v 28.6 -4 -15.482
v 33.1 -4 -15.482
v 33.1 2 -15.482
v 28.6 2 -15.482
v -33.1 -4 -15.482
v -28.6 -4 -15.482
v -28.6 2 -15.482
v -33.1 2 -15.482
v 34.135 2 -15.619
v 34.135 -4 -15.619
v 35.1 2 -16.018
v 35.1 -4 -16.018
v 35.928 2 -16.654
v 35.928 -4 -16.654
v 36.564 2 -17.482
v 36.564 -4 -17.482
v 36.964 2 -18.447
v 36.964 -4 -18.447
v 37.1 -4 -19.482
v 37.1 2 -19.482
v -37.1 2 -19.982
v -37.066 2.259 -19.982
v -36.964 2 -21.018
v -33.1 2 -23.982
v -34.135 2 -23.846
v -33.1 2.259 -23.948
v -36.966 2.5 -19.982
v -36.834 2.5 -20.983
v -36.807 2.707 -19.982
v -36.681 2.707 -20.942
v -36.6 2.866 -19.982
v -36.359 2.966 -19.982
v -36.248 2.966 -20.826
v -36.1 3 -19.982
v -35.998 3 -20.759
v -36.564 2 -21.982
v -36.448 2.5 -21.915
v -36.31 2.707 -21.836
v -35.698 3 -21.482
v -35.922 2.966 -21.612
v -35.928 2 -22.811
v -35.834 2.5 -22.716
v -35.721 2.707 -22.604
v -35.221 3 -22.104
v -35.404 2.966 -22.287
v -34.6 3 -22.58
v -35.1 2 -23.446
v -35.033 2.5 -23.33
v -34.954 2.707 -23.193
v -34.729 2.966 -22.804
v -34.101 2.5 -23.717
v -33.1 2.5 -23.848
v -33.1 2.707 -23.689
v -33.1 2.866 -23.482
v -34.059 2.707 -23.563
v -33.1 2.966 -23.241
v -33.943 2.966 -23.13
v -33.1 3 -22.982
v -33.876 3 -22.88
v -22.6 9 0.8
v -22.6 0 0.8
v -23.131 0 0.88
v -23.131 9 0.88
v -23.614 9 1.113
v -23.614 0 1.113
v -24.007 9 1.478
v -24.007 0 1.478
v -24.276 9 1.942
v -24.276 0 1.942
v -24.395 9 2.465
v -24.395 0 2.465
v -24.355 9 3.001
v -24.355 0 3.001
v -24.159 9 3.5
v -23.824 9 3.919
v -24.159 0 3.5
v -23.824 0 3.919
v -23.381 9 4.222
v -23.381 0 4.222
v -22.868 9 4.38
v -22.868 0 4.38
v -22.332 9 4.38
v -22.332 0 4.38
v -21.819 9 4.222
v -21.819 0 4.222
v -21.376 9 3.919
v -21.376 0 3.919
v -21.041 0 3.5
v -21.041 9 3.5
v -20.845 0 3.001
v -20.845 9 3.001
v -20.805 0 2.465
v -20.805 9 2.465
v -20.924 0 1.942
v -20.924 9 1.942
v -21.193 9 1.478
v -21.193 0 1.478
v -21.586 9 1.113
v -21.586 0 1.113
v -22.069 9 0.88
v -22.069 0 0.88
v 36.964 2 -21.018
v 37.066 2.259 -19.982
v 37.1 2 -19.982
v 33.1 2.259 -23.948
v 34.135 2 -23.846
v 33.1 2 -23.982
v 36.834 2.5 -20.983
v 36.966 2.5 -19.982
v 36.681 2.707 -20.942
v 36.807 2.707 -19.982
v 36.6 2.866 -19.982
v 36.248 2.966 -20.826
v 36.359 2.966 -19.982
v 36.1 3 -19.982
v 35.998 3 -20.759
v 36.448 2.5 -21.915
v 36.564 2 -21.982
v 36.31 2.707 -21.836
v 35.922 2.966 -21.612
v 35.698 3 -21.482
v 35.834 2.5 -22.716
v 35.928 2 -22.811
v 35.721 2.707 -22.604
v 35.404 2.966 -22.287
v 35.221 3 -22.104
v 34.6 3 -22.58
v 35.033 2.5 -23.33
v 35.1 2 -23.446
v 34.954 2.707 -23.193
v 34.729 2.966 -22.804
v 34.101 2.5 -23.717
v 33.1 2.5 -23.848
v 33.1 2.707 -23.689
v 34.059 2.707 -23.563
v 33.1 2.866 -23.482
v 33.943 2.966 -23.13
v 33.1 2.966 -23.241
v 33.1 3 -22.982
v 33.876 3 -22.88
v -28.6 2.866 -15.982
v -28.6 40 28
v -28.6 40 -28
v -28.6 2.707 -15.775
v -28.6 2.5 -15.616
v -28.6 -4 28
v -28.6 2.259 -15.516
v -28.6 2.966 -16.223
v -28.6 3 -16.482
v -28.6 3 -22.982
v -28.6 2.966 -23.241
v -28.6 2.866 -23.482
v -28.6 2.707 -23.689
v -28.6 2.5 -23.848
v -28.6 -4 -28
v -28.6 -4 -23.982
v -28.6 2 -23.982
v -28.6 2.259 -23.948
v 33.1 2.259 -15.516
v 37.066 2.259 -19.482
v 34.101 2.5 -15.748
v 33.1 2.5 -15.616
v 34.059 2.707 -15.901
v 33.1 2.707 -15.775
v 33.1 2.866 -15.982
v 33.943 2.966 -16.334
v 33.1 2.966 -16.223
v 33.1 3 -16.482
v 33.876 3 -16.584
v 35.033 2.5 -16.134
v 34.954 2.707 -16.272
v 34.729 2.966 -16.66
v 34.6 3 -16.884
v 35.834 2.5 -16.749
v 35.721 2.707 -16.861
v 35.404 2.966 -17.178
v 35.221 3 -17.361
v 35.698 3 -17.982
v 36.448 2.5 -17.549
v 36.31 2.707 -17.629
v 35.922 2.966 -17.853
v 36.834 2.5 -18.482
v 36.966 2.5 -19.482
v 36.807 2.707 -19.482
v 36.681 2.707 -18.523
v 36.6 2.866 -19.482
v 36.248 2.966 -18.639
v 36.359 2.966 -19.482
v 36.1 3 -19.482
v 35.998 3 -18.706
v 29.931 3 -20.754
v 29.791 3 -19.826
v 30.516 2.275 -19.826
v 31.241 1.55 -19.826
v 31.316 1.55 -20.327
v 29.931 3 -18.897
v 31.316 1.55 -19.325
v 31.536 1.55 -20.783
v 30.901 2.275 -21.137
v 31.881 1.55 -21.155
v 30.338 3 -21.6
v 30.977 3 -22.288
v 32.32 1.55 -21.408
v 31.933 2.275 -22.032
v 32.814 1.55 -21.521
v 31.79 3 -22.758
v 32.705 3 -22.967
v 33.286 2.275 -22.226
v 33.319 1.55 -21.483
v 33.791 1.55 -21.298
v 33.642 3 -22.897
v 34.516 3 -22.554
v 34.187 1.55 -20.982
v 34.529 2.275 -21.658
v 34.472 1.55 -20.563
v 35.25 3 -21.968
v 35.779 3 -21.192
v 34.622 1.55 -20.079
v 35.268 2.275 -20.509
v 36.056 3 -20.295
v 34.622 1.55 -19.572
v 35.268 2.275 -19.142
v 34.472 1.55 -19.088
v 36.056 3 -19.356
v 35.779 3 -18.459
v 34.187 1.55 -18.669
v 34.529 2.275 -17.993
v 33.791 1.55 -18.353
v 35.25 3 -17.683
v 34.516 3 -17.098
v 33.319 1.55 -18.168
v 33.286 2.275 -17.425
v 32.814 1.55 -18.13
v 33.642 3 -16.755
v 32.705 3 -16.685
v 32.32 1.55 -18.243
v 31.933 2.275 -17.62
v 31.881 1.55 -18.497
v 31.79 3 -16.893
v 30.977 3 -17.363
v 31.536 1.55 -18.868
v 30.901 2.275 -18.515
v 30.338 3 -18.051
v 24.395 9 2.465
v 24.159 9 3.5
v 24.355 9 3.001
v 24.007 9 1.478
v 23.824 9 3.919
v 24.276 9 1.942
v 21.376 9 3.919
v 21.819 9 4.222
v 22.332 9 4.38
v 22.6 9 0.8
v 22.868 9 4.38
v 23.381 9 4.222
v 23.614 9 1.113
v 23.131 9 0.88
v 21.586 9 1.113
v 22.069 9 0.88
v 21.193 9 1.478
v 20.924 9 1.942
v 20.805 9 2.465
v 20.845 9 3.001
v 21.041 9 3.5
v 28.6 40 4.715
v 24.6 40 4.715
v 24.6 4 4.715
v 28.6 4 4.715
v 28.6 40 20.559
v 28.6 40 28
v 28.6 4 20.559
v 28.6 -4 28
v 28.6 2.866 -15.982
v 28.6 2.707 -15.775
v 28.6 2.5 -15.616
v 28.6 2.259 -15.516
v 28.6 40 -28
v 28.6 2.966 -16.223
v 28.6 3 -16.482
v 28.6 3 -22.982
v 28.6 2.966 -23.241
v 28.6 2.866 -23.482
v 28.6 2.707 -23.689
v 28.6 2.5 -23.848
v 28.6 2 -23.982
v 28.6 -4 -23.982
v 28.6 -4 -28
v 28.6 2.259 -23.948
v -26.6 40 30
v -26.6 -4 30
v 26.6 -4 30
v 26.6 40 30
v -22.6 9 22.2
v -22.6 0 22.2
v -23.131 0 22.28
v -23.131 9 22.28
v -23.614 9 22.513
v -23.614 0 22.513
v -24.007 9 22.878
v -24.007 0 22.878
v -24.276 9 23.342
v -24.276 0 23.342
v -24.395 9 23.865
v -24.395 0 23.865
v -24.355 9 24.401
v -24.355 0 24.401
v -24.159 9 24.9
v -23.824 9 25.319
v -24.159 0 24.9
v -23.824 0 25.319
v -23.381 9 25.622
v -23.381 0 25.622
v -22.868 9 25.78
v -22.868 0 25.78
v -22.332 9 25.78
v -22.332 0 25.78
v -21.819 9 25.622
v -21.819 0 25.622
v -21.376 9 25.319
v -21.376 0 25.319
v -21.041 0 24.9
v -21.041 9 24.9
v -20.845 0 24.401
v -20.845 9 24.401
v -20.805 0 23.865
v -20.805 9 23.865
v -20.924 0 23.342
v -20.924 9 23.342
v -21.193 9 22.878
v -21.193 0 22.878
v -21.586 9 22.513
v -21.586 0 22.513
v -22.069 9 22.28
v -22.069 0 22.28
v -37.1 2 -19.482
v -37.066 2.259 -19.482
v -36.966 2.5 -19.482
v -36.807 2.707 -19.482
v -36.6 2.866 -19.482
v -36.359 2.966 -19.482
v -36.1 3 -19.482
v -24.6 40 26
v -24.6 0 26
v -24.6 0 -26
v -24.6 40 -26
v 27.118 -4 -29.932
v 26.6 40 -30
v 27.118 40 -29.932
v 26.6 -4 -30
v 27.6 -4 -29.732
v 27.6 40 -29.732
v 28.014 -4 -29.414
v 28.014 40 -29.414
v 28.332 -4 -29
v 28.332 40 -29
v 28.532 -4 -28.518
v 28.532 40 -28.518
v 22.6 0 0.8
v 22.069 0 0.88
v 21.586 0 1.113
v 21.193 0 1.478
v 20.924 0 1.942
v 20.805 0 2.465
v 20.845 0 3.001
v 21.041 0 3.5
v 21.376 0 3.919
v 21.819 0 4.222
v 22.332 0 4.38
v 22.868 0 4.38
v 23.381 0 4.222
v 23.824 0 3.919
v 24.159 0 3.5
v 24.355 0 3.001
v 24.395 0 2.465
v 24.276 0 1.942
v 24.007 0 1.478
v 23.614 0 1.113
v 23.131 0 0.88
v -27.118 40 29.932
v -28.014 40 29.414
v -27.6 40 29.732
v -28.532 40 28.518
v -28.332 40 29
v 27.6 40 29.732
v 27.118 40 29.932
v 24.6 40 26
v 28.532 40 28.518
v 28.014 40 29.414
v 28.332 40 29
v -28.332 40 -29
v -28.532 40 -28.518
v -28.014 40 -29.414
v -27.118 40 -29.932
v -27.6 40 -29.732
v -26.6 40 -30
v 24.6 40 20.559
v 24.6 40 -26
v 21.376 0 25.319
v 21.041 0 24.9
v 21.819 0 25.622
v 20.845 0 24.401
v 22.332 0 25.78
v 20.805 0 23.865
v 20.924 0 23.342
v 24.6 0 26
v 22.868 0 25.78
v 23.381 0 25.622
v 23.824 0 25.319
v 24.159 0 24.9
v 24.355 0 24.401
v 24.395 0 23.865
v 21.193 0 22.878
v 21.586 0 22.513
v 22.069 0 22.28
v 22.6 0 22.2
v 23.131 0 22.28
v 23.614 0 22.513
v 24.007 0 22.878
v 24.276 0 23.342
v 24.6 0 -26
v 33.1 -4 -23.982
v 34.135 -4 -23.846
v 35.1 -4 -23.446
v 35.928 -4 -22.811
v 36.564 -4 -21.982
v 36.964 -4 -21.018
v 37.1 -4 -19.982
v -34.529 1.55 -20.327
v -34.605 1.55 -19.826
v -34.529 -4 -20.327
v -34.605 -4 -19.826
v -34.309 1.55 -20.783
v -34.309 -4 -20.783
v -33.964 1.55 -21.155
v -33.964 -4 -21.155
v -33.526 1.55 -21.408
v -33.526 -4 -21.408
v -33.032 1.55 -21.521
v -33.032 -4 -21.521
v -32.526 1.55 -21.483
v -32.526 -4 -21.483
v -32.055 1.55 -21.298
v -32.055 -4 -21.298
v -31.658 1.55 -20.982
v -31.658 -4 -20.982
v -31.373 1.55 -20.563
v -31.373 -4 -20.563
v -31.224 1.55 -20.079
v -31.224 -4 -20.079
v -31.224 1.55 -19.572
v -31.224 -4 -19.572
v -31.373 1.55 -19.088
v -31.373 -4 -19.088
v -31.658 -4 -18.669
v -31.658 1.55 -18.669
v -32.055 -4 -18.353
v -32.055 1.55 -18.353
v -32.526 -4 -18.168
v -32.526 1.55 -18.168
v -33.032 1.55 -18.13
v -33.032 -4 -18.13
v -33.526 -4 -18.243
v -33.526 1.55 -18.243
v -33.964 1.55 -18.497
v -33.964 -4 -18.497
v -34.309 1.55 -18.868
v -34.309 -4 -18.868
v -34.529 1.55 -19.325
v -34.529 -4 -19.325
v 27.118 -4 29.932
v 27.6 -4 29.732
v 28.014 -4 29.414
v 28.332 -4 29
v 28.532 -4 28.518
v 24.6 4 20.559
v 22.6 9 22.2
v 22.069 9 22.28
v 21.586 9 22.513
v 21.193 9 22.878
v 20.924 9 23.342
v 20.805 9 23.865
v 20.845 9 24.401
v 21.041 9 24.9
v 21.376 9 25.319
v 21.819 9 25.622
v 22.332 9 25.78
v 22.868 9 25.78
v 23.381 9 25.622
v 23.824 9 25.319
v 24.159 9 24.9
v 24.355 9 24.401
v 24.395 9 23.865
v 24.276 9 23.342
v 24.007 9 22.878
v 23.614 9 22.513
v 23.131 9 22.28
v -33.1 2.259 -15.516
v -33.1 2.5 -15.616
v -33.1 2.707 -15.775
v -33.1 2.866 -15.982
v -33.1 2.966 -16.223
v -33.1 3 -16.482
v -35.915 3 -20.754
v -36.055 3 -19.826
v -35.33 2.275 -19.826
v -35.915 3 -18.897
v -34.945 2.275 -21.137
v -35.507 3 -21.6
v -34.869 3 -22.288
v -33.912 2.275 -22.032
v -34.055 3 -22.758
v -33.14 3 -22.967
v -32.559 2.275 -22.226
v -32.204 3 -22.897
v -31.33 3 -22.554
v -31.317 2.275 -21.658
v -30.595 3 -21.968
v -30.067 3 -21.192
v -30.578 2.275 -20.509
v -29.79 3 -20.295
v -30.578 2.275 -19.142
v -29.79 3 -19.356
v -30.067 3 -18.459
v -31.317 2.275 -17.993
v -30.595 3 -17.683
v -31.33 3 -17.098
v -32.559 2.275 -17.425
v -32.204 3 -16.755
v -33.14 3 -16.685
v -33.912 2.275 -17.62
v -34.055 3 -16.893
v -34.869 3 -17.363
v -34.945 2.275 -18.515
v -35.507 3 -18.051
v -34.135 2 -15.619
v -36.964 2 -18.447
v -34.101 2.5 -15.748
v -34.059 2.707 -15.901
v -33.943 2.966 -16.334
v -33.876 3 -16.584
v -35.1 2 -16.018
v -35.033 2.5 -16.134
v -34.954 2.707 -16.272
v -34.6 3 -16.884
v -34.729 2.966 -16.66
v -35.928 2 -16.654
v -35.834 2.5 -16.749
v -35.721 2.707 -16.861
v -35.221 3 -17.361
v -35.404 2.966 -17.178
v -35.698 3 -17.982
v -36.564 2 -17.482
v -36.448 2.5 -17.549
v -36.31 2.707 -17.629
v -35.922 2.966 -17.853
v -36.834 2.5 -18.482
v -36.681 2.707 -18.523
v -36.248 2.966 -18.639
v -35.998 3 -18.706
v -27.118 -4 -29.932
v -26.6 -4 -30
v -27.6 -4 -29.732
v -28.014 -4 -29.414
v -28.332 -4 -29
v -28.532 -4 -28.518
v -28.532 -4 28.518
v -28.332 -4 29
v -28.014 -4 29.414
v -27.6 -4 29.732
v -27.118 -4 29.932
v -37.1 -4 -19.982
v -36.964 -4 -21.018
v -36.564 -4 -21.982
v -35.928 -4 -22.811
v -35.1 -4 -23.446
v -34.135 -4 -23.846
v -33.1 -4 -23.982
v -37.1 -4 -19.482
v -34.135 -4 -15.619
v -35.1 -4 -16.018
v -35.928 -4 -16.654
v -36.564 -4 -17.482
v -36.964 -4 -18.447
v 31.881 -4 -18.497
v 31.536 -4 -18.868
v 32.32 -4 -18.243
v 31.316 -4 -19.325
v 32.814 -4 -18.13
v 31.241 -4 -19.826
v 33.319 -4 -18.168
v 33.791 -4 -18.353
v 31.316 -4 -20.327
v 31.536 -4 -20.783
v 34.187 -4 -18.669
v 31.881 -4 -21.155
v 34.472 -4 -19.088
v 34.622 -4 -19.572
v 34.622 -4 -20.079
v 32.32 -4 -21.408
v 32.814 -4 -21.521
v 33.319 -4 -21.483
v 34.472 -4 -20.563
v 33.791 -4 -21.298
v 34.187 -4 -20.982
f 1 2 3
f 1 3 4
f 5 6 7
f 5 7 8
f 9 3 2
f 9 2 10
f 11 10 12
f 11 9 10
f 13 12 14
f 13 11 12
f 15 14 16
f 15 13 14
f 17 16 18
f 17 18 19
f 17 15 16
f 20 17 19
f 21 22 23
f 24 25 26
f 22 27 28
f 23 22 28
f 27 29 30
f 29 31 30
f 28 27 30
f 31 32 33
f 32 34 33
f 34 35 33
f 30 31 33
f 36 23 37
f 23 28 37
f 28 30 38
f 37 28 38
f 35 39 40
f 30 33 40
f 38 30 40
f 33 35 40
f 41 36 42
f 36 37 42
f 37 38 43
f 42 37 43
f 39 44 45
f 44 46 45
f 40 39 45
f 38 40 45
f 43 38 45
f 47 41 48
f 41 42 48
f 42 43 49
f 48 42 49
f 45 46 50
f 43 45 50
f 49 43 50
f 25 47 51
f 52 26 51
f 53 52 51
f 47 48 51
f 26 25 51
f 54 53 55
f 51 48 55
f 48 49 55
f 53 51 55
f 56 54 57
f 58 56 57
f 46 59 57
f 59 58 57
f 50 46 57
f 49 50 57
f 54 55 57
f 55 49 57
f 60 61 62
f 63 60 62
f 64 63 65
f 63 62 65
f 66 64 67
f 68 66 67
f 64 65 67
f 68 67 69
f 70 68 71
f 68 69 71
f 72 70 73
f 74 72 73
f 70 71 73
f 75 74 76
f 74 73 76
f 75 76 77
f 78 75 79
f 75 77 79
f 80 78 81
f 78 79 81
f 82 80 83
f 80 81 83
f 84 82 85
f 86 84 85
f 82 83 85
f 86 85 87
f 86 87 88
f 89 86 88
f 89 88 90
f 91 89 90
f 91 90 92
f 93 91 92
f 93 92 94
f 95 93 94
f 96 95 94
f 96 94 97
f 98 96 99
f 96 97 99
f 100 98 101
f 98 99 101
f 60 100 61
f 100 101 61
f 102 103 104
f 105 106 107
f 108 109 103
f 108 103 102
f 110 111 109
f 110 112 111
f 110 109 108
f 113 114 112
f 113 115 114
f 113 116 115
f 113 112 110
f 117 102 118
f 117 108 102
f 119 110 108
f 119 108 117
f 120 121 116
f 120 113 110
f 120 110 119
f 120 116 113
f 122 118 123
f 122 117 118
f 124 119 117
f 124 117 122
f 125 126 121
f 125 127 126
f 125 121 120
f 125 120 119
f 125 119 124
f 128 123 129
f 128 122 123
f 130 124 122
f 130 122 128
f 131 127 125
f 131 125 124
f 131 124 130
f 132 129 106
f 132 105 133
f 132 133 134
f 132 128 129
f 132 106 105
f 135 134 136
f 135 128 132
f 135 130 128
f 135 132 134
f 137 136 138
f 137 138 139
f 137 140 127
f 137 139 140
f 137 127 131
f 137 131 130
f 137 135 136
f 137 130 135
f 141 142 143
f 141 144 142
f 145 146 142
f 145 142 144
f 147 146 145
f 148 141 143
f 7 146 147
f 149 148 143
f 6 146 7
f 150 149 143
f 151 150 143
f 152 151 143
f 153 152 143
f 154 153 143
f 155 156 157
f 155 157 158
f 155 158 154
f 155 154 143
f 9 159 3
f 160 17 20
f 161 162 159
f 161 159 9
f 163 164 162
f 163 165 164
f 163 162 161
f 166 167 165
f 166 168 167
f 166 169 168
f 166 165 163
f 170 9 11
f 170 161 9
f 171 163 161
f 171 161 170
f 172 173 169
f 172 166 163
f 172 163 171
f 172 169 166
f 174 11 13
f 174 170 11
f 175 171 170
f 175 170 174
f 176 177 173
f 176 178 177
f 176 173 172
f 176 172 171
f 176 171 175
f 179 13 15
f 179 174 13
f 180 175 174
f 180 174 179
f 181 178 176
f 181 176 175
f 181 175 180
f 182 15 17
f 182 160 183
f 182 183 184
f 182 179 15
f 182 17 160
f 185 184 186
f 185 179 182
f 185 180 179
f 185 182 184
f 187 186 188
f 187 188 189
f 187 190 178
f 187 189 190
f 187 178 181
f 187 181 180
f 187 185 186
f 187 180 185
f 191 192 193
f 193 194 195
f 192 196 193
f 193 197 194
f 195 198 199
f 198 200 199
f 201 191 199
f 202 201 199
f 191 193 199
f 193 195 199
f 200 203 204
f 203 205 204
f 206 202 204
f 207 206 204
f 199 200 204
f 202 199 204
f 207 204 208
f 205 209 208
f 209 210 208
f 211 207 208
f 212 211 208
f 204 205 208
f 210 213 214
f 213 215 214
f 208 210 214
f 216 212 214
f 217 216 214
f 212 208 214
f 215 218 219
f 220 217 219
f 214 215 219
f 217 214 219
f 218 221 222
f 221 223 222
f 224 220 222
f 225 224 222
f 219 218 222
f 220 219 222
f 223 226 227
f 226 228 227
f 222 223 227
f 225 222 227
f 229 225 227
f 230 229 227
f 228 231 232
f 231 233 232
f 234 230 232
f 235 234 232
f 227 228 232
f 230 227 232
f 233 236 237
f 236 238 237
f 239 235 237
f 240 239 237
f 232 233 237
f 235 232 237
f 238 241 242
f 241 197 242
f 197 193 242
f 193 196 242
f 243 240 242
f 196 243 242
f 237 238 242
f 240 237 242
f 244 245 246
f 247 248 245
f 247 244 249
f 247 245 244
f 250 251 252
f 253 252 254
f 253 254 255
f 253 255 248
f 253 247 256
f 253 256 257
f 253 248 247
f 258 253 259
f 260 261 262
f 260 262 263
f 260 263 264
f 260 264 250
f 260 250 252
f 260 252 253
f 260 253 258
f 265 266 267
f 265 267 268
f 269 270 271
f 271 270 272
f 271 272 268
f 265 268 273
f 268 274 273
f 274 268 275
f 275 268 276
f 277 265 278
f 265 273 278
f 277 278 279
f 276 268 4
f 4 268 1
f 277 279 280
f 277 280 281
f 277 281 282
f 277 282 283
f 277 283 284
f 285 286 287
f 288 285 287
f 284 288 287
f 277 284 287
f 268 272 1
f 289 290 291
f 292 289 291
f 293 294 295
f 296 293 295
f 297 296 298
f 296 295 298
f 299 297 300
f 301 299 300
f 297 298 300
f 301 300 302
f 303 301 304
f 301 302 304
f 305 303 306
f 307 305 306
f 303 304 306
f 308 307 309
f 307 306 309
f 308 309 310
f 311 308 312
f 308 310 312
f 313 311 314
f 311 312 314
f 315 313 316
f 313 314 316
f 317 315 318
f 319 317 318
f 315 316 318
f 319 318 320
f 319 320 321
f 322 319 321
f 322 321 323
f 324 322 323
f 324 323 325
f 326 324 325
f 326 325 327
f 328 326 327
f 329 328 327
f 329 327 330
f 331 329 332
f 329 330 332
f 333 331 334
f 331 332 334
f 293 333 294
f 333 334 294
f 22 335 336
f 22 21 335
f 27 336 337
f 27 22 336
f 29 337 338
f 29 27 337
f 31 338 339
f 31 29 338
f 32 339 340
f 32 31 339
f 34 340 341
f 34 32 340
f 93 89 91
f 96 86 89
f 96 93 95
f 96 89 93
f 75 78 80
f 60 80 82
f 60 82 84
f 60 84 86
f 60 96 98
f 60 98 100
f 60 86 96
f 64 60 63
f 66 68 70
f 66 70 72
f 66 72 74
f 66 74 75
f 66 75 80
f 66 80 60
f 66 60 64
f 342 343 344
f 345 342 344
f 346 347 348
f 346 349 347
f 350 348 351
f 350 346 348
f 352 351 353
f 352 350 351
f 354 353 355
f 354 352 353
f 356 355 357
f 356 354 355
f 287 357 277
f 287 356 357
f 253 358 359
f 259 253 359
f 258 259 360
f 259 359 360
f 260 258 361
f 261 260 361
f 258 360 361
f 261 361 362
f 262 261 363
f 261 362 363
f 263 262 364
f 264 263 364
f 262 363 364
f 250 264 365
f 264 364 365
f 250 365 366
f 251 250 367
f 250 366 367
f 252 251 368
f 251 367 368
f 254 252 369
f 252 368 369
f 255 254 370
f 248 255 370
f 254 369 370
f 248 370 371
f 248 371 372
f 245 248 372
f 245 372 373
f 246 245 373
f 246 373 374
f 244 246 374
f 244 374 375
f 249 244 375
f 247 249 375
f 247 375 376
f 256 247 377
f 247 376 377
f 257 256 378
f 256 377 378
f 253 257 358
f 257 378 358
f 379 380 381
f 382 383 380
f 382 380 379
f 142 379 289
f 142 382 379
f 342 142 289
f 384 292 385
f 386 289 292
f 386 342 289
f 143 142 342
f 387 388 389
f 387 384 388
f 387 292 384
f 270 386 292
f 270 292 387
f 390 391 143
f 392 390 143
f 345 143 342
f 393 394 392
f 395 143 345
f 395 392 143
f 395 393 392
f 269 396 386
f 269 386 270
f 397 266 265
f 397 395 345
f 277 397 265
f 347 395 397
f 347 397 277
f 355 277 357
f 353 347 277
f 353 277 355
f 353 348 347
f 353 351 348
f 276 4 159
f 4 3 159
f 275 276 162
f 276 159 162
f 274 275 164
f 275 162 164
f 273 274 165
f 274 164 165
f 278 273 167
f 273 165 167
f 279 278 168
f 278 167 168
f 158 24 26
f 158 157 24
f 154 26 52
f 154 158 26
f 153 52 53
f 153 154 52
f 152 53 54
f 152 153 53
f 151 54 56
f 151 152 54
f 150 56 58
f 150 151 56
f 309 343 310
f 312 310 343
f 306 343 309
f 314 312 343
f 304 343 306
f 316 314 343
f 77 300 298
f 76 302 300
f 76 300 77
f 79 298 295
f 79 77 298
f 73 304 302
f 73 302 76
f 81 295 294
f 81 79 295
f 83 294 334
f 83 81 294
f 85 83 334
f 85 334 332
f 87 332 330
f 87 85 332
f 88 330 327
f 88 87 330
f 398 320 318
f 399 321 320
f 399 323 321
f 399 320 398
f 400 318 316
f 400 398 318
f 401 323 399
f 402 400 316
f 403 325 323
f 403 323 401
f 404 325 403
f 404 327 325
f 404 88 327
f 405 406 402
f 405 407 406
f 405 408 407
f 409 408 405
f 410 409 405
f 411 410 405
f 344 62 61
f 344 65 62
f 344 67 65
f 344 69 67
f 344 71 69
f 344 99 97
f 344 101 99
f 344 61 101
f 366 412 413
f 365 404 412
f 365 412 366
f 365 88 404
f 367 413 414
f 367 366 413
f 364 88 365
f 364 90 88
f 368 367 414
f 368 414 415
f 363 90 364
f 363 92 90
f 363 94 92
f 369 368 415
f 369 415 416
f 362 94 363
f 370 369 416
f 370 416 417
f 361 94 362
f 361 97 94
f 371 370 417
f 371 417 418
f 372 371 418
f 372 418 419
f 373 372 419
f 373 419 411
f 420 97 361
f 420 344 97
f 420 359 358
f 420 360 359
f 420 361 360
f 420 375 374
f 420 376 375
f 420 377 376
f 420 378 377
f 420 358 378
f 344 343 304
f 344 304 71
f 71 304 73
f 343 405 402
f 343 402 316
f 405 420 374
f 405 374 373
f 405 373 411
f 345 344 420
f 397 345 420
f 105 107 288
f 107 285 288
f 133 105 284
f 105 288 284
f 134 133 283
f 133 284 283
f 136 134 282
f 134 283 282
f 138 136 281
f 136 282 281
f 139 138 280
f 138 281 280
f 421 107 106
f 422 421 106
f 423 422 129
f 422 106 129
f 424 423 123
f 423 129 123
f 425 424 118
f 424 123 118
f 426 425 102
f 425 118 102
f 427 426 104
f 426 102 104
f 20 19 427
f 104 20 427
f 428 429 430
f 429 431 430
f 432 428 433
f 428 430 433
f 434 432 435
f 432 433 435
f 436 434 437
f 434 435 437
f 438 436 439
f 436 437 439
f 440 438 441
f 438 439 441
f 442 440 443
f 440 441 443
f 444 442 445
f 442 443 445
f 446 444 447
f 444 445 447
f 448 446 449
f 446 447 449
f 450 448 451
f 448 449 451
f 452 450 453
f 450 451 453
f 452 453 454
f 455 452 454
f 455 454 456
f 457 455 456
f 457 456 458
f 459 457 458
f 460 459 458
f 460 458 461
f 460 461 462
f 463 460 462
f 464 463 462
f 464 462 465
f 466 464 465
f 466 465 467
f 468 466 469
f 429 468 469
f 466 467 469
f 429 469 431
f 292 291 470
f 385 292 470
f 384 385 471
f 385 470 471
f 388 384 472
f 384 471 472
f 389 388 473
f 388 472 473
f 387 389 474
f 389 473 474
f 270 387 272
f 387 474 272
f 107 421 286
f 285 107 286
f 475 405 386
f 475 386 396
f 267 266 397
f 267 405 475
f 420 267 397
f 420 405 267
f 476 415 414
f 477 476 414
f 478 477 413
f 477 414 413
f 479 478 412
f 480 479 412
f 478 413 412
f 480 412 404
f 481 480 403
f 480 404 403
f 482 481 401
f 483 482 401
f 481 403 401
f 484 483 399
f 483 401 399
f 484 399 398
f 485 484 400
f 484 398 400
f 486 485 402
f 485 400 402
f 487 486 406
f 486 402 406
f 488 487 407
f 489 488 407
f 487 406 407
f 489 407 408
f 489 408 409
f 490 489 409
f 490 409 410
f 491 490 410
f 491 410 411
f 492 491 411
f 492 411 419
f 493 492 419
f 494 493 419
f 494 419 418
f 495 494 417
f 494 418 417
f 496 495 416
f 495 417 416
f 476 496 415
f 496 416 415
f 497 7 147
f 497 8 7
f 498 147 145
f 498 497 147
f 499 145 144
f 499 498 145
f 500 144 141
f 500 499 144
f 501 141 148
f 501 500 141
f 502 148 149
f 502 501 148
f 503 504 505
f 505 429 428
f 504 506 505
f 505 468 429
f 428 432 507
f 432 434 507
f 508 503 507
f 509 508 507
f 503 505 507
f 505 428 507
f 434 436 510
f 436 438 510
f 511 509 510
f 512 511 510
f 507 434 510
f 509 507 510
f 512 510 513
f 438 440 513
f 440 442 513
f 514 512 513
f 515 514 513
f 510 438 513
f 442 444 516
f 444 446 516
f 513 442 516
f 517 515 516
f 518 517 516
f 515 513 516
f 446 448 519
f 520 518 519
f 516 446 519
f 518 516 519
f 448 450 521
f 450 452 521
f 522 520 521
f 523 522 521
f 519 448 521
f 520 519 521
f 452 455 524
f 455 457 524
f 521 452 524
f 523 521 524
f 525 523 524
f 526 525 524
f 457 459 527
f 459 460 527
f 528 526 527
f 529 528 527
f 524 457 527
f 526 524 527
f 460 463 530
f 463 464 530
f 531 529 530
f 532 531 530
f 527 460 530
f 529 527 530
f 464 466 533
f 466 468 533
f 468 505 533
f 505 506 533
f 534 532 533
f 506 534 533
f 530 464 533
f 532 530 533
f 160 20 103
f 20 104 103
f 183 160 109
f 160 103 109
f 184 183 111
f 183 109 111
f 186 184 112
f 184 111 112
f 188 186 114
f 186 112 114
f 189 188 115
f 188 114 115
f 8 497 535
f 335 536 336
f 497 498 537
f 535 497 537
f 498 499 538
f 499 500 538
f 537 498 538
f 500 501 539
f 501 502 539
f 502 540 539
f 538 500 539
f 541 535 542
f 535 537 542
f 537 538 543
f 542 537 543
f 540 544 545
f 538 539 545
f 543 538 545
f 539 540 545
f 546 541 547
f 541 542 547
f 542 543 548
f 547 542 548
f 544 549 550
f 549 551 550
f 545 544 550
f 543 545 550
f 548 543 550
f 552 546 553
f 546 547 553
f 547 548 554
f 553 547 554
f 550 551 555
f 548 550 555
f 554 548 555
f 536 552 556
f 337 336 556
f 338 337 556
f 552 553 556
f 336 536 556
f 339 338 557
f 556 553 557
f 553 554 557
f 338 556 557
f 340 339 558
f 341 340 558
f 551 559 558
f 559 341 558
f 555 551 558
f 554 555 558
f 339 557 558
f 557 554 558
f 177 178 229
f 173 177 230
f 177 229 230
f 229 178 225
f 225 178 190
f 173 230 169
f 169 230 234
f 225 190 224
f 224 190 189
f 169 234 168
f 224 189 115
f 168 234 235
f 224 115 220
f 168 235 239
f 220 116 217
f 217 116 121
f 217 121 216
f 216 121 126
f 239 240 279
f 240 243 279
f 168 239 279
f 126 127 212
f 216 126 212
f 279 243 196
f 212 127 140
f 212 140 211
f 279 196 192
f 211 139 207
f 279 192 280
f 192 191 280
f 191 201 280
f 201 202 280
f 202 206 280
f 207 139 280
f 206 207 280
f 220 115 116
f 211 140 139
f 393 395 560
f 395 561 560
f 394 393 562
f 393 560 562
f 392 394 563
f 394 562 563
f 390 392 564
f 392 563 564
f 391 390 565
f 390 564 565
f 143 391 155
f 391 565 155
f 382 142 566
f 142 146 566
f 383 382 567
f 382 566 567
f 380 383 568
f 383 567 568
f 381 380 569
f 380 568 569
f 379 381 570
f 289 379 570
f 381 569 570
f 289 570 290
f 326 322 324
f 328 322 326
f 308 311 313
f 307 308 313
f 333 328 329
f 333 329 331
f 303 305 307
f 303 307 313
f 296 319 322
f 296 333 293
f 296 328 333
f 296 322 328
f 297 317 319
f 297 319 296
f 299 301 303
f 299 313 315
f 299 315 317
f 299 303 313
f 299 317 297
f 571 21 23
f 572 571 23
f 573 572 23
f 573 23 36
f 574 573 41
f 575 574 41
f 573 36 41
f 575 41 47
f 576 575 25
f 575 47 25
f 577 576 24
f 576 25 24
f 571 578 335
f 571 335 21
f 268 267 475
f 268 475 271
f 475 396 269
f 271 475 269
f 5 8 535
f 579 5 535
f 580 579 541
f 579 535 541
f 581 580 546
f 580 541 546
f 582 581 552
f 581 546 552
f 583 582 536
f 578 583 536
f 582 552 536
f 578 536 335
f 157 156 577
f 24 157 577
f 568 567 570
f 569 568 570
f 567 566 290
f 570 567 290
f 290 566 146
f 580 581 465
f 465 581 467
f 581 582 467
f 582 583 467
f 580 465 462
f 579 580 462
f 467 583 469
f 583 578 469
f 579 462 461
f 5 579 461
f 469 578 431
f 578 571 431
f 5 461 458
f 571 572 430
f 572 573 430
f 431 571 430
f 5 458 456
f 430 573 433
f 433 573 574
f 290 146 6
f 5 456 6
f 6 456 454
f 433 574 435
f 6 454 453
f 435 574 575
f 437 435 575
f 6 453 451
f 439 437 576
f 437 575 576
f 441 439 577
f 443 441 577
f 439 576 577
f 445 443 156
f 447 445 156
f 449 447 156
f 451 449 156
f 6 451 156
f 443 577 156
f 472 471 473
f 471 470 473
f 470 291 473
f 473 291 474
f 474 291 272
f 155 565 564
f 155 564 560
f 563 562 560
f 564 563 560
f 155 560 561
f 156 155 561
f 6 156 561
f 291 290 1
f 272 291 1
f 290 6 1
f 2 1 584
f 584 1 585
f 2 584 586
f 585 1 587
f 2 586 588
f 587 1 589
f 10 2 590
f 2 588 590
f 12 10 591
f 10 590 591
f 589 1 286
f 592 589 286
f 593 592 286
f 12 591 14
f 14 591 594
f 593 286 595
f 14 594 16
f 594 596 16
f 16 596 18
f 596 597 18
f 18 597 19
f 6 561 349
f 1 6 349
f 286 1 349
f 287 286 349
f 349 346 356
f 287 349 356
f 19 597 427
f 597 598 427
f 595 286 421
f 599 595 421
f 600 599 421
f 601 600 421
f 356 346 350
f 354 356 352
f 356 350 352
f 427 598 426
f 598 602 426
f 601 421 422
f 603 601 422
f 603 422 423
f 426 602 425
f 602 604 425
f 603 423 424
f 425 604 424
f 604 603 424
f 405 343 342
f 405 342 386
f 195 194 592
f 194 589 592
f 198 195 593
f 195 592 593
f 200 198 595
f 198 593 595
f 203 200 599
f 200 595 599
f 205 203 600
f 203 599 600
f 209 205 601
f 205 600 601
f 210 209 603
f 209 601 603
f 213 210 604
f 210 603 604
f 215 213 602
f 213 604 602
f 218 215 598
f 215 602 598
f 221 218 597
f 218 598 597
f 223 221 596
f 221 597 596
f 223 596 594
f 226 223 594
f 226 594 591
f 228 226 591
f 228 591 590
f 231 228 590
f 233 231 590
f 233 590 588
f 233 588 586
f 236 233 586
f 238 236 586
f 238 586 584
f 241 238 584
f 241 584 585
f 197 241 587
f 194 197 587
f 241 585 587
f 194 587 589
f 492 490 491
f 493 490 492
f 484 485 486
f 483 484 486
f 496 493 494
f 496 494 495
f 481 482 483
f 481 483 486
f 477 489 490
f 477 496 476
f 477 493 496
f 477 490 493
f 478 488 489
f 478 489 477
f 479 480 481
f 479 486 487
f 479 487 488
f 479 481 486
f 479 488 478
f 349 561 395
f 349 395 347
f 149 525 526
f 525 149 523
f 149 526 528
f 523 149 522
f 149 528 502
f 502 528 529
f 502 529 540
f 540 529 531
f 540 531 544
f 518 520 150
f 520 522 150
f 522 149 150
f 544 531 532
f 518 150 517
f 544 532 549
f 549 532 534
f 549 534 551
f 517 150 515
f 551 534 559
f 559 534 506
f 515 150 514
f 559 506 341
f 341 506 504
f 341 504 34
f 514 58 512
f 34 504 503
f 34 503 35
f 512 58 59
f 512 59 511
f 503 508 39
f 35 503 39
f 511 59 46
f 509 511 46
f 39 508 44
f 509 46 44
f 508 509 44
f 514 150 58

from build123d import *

# Parameters (mm, degrees)
ESQUISSE1_W                                    = 49.2
ESQUISSE1_H                                    = 52
BOSS_EXTRU_1_DEPTH                             = 40
COQUE1_T                                       = 4
CONG_1_R                                       = 2
CONG_2_R                                       = 2
CONG_3_R                                       = 2
CONG_4_R                                       = 2
ESQUISSE5_R                                    = 1.8
BOSS_EXTRU_2_DEPTH                             = 9
ESQUISSE9_W                                    = 4
ESQUISSE9_H                                    = 15.843796137
ENL_V_MAT_EXTRU_3_DEPTH                        = 36
ESQUISSE11_W                                   = 8.5
ESQUISSE11_H                                   = 8.5
BOSS_EXTRU_4_DEPTH                             = 7
CONG_5_R                                       = 4
CONG_6_R                                       = 4
CONG_7_R                                       = 1
CONG_8_R                                       = 1
FRAISAGE_POUR_VIS_T_TE_FRAIS_E_M31_D           = 3.4
FRAISAGE_POUR_VIS_T_TE_FRAIS_E_M31_CSINK_D     = 6.3
FRAISAGE_POUR_VIS_T_TE_FRAIS_E_M31_CSINK_ANGLE = 90


with BuildPart() as part:
    # Esquisse1 → Boss.-Extru.1 (new body)
    with BuildSketch(Plane(origin=(0, 0, 0), x_dir=(1, 0, 0), z_dir=(0, 1, 0))):
        Rectangle(ESQUISSE1_W, ESQUISSE1_H)
    extrude(amount=BOSS_EXTRU_1_DEPTH)

    # Coque1
    coque1_openings = [part.faces().sort_by_distance(p)[0] for p in [
        (0, 40, 0),
    ]]
    offset(amount=COQUE1_T, openings=coque1_openings, kind=Kind.INTERSECTION)

    # Congé1
    # the kernel refuses this fillet: 2 mm, written as the material it takes off along each edge
    with BuildSketch(Plane(origin=(28.6, -9, 30), x_dir=(-1, 0, 0), z_dir=(0, 1, 0))) as cong_1_piece_1:
        with BuildLine():
            CenterArc((CONG_1_R, -CONG_1_R), CONG_1_R, 90, 90)
            Line((0, -CONG_1_R), (0, 0))
            Line((0, 0), (CONG_1_R, 0))
        make_face()
    extrude(amount=54, mode=Mode.SUBTRACT)

    # Congé2
    cong_2_edges = [part.edges().sort_by_distance(p)[0] for p in [
        (28.6, 18, -30),
    ]]
    fillet(cong_2_edges, radius=CONG_2_R)

    # Congé3
    cong_3_edges = [part.edges().sort_by_distance(p)[0] for p in [
        (-28.6, 18, -30),
    ]]
    fillet(cong_3_edges, radius=CONG_3_R)

    # Congé4
    cong_4_edges = [part.edges().sort_by_distance(p)[0] for p in [
        (-28.6, 18, 30),
    ]]
    fillet(cong_4_edges, radius=CONG_4_R)

    # Esquisse5 → Boss.-Extru.2 (add)
    with BuildSketch(Plane(origin=(0, 0, 0), x_dir=(1, 0, 0), z_dir=(0, 1, 0))):
        with Locations(Location((-22.6, -2.6, 0), (0, 0, 90))):
            Circle(ESQUISSE5_R)
        with Locations(Location((22.6, -2.6, 0), (0, 0, 90))):
            Circle(ESQUISSE5_R)
        with Locations(Location((-22.6, -24, 0), (0, 0, 90))):
            Circle(ESQUISSE5_R)
        with Locations(Location((22.6, -24, 0), (0, 0, 90))):
            Circle(ESQUISSE5_R)
    extrude(amount=BOSS_EXTRU_2_DEPTH)

    # Esquisse9 → Enlèv. mat.-Extru.3 (cut)
    with BuildSketch(Plane(origin=(0, 40, 0), x_dir=(1, 0, 0), z_dir=(0, 1, 0))):
        with Locations((26.6, -12.636910853)):
            Rectangle(ESQUISSE9_W, ESQUISSE9_H)
    extrude(amount=-ENL_V_MAT_EXTRU_3_DEPTH, mode=Mode.SUBTRACT)

    # Esquisse11 → Boss.-Extru.4 (add)
    with BuildSketch(Plane(origin=(0, -4, 0), x_dir=(-1, 0, 0), z_dir=(0, -1, 0))):
        with Locations((32.85, 19.732237021)):
            Rectangle(ESQUISSE11_W, ESQUISSE11_H)
        with Locations((-32.85, 19.732237021)):
            Rectangle(ESQUISSE11_W, ESQUISSE11_H)
    extrude(amount=-BOSS_EXTRU_4_DEPTH)

    # Congé5
    cong_5_edges = [part.edges().sort_by_distance(p)[0] for p in [
        (37.1, -0.5, -15.482237021),
        (37.1, -0.5, -23.982237021),
    ]]
    fillet(cong_5_edges, radius=CONG_5_R)

    # Congé6
    cong_6_edges = [part.edges().sort_by_distance(p)[0] for p in [
        (-37.1, -0.5, -23.982237021),
        (-37.1, -0.5, -15.482237021),
    ]]
    fillet(cong_6_edges, radius=CONG_6_R)

    # Congé7
    cong_7_edges = [part.edges().sort_by_distance(p)[0] for p in [
        (-37.1, 3, -19.732237021),
        (-30.85, 3, -23.982237021),
        (-35.928427125, 3, -16.653809897),
        (-35.928427125, 3, -22.810664146),
        (-30.85, 3, -15.482237021),
    ]]
    fillet(cong_7_edges, radius=CONG_7_R)

    # Congé8
    cong_8_edges = [part.edges().sort_by_distance(p)[0] for p in [
        (37.1, 3, -19.732237021),
        (30.85, 3, -15.482237021),
        (35.928427125, 3, -22.810664146),
        (35.928427125, 3, -16.653809897),
        (30.85, 3, -23.982237021),
    ]]
    fillet(cong_8_edges, radius=CONG_8_R)

    # Fraisage pour vis à tête fraisée M31 (through all)
    with Locations(Plane(origin=(0, 3, 0), x_dir=(1, 0, 0), z_dir=(0, 1, 0))):
        with Locations((-32.904561285, 19.825700849), (32.940796686, 19.825700849)):
            CounterSinkHole(FRAISAGE_POUR_VIS_T_TE_FRAIS_E_M31_D / 2, FRAISAGE_POUR_VIS_T_TE_FRAIS_E_M31_CSINK_D / 2, counter_sink_angle=FRAISAGE_POUR_VIS_T_TE_FRAIS_E_M31_CSINK_ANGLE)


solid = part.part
